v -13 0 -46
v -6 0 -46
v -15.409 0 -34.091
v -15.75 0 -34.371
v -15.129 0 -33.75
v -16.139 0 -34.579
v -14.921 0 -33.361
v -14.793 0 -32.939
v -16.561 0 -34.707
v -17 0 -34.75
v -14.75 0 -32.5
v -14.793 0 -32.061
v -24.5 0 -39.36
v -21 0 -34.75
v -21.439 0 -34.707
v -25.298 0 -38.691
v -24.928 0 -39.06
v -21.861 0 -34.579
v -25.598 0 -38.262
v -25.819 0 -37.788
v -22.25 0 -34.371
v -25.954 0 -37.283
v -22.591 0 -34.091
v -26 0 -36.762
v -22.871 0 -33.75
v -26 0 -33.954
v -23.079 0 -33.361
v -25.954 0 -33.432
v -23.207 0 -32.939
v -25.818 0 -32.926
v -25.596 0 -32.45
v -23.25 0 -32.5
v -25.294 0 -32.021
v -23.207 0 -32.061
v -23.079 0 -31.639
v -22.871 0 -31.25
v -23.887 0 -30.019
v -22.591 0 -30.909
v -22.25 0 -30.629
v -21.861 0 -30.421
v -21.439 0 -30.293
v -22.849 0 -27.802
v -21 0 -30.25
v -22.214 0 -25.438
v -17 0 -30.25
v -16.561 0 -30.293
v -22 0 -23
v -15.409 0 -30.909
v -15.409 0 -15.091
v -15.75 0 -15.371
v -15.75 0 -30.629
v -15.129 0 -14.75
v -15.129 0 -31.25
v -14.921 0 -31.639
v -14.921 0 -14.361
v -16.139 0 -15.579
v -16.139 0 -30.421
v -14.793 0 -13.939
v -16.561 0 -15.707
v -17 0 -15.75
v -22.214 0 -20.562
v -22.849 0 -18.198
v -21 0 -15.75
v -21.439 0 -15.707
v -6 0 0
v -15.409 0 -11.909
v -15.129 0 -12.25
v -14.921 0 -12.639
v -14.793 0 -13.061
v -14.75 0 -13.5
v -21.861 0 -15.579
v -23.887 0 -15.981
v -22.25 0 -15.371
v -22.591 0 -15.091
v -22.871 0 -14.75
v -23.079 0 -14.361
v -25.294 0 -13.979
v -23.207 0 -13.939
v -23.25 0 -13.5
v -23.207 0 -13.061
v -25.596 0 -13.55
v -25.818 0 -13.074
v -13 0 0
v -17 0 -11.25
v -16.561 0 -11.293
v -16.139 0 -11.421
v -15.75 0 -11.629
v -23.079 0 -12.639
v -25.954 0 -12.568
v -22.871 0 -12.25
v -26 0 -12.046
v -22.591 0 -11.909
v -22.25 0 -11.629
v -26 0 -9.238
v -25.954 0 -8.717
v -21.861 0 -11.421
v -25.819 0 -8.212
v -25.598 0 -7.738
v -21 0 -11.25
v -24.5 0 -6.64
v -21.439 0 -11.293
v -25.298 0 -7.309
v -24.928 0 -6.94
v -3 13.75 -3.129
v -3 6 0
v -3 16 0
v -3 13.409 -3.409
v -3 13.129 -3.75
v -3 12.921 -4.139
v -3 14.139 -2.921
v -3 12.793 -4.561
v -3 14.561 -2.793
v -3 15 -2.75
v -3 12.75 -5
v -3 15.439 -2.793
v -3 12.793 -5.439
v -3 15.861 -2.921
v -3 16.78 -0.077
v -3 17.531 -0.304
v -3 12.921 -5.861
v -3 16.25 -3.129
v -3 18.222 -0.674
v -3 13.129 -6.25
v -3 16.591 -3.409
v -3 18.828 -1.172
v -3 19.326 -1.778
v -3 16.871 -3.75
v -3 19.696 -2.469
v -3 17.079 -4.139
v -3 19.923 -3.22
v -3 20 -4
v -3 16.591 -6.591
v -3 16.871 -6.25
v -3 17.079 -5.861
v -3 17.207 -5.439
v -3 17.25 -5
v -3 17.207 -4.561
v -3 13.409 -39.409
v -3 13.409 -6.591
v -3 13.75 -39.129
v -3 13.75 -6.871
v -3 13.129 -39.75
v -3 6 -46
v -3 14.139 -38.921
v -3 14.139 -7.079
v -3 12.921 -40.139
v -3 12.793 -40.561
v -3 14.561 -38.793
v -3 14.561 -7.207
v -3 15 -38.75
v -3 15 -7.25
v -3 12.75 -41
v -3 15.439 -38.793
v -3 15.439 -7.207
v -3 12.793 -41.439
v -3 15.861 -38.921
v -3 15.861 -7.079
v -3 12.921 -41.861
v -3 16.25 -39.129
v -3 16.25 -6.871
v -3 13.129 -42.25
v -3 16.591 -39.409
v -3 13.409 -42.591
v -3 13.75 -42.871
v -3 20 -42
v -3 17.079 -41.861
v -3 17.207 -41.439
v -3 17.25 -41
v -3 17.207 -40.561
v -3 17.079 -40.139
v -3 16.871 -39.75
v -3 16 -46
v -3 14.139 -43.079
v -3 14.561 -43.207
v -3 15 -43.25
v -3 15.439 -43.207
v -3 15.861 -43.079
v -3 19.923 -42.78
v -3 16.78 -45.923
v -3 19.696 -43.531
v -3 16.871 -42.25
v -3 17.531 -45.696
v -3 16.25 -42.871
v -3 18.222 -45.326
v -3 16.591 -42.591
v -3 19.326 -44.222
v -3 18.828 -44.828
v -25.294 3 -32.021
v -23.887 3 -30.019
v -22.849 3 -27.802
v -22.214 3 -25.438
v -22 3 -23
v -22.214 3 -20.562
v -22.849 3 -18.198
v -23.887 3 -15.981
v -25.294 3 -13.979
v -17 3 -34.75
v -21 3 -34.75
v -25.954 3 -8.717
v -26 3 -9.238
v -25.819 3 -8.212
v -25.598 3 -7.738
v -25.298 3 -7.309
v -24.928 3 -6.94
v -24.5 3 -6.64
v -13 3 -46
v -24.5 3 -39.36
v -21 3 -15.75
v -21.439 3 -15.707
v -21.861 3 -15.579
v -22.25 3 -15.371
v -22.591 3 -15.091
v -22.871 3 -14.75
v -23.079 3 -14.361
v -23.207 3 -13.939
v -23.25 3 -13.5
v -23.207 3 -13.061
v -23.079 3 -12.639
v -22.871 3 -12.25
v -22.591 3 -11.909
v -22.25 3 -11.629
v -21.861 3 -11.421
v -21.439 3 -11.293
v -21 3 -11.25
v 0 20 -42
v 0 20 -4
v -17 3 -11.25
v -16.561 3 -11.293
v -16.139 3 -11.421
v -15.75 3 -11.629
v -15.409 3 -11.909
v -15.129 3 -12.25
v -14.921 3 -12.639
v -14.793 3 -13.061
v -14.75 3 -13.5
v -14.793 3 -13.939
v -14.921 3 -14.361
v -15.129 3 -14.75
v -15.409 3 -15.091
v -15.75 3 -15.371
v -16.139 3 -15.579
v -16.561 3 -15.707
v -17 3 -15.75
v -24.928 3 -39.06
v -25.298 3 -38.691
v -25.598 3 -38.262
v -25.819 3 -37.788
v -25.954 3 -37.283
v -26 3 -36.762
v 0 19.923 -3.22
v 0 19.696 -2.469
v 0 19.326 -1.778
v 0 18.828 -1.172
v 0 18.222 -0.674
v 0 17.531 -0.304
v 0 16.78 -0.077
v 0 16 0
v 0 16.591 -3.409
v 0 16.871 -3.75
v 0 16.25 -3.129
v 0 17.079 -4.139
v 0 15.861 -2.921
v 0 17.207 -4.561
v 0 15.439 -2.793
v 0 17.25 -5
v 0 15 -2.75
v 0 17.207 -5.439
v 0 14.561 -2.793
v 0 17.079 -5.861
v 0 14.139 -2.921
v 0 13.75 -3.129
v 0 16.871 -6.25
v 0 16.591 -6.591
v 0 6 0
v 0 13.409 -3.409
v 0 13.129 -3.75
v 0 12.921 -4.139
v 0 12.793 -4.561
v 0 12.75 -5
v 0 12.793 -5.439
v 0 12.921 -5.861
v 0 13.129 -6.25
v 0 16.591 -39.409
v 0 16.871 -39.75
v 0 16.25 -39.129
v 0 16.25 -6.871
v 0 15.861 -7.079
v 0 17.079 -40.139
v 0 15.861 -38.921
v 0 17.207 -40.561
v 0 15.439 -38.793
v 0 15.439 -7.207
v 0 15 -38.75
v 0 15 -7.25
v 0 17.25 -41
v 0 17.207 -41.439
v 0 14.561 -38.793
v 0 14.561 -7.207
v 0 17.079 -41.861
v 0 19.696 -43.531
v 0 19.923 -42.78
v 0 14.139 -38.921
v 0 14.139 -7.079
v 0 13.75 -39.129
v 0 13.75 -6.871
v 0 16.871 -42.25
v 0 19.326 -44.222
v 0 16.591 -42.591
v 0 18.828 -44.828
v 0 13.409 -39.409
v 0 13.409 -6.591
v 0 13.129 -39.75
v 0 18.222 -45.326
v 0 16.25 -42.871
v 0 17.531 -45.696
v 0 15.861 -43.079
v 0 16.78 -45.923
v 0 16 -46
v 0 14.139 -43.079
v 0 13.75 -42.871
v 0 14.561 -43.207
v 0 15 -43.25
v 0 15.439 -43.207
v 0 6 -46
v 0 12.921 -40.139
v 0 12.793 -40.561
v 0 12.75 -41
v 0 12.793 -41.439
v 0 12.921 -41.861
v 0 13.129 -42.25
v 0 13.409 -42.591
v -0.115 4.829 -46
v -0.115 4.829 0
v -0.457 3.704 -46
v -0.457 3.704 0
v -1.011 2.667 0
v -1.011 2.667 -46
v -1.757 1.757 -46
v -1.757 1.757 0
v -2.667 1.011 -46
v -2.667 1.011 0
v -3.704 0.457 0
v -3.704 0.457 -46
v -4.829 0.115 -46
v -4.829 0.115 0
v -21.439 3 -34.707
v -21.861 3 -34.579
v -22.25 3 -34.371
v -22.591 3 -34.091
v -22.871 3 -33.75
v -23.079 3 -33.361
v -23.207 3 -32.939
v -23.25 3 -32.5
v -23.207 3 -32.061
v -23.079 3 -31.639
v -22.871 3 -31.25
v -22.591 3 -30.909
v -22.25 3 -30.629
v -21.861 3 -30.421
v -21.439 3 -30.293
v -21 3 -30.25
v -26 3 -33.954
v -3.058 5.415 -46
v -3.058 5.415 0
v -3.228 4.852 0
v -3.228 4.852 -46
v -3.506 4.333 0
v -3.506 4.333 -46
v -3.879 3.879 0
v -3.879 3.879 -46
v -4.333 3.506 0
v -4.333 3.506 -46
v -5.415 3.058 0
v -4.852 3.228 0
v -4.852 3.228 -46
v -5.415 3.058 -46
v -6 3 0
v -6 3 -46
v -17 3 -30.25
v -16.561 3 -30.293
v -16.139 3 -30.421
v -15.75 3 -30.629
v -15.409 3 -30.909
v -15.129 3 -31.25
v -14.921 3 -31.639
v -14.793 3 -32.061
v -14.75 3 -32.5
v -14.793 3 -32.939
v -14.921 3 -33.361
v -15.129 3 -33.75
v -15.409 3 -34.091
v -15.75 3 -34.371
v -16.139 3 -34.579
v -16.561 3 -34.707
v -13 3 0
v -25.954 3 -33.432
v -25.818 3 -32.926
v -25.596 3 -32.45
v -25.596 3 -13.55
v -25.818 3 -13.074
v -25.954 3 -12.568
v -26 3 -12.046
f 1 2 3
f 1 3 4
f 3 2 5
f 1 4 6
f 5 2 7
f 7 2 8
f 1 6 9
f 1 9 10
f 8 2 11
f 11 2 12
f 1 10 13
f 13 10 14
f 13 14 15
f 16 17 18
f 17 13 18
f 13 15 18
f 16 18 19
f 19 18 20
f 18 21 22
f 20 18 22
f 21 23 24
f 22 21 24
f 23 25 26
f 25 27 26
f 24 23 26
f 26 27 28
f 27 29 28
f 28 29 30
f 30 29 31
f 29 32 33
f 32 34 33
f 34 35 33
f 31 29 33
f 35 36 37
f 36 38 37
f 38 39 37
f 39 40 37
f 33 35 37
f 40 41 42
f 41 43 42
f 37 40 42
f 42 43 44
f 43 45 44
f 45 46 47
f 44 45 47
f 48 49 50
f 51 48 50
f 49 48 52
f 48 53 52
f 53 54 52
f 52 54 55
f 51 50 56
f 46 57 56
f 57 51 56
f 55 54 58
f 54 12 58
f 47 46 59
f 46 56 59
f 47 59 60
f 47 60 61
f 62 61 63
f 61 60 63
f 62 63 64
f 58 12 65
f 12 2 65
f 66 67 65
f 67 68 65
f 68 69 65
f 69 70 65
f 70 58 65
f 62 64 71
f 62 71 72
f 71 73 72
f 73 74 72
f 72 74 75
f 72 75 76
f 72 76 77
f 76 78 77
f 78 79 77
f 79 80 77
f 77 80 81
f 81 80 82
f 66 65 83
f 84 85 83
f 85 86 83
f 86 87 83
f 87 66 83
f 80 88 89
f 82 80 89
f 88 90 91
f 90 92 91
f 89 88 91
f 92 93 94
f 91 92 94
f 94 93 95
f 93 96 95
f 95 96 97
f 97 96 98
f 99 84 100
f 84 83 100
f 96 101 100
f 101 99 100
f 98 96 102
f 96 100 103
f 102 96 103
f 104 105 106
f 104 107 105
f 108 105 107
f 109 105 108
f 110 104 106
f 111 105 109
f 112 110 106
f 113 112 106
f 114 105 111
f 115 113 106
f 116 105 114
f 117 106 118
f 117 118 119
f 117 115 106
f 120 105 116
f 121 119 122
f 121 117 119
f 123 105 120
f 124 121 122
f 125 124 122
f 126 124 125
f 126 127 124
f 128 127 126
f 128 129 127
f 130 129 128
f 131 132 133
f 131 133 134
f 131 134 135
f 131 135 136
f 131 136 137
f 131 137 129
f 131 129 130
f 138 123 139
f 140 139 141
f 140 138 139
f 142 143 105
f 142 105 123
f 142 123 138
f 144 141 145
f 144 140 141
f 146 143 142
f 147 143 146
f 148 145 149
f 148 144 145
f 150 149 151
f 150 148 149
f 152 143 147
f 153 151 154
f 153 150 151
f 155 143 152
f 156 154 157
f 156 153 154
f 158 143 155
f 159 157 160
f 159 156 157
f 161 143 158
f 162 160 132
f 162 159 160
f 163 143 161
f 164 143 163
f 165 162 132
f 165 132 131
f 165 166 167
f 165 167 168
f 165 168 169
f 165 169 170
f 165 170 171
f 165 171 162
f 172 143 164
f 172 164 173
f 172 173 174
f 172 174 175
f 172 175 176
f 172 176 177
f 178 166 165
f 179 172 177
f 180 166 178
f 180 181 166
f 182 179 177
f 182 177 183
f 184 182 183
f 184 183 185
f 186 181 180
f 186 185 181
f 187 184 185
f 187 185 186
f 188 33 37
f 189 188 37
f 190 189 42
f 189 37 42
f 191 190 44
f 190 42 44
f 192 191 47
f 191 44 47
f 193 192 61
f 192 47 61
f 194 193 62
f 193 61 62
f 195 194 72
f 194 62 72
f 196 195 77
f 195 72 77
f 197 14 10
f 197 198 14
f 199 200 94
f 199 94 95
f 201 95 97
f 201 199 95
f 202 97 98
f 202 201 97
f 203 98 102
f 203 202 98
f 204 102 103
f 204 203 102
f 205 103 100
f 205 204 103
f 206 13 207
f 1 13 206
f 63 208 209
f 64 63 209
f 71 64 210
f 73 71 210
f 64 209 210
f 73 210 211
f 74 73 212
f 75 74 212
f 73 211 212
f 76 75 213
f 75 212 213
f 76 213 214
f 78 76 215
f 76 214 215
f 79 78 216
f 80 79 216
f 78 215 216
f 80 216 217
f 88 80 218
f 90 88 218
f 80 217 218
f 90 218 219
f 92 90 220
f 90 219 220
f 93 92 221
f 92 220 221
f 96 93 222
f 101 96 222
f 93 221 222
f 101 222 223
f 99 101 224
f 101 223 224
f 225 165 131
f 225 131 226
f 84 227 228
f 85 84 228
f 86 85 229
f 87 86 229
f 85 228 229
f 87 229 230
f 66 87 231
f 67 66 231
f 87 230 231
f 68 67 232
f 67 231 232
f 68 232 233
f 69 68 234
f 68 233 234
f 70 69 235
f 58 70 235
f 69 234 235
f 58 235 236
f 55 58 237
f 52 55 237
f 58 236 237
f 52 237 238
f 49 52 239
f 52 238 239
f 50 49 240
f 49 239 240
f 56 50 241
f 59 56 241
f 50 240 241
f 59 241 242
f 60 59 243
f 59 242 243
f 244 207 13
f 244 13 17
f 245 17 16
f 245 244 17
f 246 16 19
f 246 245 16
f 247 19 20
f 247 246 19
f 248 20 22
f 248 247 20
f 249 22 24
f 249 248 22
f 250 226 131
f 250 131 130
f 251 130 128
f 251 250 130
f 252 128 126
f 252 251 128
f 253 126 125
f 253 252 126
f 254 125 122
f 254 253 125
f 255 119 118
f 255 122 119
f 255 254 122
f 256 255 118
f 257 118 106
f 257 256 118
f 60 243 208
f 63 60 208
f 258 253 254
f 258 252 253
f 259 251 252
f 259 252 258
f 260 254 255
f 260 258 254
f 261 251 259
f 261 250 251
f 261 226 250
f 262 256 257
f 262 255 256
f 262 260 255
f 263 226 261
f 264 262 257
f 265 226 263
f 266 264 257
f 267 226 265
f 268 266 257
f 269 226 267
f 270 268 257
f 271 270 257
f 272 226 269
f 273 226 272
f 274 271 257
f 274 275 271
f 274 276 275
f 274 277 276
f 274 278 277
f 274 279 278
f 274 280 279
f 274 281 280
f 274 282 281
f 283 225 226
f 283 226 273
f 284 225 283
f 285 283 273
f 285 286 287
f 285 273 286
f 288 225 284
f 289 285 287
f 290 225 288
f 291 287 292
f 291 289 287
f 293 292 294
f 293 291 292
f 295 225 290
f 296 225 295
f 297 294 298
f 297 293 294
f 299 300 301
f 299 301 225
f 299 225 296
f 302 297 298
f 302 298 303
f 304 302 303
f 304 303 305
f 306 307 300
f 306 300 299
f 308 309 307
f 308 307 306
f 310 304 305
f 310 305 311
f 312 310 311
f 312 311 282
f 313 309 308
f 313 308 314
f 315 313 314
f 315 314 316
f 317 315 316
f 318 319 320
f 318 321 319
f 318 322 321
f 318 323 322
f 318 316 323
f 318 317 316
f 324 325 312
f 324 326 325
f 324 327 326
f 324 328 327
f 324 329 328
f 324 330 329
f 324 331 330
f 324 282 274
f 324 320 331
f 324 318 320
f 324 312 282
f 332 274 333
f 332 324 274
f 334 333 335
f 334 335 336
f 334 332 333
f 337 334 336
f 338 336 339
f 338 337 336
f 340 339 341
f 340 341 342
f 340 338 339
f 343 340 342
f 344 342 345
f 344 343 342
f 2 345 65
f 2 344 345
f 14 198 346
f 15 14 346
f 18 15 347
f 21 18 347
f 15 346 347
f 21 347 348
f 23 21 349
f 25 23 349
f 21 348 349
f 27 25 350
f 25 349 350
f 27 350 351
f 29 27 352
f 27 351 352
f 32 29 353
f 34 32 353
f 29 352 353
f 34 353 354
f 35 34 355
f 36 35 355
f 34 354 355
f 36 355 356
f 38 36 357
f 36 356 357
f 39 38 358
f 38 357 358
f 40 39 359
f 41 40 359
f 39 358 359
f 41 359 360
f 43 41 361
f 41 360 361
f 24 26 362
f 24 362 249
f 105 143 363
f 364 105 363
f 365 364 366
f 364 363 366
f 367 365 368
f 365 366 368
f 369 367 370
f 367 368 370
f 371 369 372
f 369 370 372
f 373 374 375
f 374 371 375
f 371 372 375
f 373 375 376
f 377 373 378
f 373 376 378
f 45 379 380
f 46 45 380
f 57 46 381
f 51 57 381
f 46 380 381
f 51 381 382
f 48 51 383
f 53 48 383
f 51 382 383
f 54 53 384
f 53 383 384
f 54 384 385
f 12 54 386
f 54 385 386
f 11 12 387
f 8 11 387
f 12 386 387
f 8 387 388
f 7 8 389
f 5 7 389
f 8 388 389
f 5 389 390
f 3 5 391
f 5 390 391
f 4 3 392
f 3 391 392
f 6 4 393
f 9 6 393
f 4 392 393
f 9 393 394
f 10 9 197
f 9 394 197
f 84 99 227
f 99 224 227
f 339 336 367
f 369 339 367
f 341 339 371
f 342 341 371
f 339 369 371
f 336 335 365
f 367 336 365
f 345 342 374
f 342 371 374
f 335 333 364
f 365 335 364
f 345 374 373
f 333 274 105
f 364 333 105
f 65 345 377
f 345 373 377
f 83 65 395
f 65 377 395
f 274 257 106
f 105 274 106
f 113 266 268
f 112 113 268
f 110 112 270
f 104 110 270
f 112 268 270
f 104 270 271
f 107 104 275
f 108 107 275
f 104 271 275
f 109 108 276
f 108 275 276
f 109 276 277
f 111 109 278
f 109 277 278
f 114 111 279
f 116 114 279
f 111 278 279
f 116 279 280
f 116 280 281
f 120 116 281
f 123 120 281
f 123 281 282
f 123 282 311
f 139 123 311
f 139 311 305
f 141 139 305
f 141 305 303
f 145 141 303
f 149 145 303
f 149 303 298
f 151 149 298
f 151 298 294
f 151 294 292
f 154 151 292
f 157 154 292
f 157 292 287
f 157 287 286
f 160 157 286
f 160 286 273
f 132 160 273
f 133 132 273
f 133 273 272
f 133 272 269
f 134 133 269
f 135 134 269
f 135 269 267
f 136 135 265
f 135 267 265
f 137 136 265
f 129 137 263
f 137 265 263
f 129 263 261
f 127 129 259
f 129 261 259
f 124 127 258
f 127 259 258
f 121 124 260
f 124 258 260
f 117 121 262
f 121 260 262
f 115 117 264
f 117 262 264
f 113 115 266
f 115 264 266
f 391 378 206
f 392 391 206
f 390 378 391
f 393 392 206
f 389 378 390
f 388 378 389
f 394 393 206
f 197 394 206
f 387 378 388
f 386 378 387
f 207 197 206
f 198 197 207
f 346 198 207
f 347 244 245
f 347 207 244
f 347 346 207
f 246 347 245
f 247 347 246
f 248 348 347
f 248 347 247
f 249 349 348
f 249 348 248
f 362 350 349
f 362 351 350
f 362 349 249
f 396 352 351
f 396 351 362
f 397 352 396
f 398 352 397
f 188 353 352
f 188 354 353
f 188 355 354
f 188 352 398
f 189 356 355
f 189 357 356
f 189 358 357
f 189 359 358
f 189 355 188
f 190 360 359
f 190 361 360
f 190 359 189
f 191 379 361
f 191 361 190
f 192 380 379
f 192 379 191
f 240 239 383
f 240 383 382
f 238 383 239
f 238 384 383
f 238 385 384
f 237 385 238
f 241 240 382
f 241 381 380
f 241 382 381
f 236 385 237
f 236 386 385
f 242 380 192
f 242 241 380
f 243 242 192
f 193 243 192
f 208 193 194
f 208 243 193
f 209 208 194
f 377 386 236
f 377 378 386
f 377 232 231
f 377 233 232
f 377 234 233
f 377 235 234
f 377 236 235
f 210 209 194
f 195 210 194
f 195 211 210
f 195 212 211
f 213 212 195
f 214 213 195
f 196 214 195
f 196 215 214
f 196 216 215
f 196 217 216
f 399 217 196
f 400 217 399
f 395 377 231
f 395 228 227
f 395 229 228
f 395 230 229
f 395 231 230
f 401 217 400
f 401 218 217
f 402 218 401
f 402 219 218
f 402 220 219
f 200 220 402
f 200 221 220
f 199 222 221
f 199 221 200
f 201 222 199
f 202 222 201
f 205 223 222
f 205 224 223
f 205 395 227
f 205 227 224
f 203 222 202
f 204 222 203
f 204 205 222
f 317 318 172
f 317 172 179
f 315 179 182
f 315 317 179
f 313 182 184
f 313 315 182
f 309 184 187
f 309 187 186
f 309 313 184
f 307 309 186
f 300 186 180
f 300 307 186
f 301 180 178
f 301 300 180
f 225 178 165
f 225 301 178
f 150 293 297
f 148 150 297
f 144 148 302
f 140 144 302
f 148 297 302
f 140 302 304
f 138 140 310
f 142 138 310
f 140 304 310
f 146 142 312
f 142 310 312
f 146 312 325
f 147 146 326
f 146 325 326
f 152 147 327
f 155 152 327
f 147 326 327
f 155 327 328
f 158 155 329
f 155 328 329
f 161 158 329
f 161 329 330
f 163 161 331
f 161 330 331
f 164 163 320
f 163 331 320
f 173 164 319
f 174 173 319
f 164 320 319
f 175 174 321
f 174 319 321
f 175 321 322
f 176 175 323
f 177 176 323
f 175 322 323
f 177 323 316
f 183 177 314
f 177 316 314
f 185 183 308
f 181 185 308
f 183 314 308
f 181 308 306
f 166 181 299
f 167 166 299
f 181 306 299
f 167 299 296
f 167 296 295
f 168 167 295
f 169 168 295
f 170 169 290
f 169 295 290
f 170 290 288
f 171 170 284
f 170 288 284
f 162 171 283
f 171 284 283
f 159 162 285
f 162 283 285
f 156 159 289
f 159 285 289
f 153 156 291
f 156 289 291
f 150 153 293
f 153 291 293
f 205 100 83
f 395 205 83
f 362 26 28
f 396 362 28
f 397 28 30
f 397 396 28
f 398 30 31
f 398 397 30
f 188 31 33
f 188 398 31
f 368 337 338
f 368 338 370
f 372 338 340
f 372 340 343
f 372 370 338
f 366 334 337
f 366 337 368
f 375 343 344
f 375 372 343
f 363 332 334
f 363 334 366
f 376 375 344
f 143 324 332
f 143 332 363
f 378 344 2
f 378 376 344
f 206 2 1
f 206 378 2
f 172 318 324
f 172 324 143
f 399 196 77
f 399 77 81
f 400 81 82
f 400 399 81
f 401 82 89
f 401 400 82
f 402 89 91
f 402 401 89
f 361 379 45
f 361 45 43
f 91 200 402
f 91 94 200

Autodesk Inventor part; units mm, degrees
ref_plane "YZ Plane" through (0, 0, 0) normal (1, 0, 0) x (0, 1, 0)
ref_plane "XZ Plane" through (0, 0, 0) normal (0, 1, 0) x (-1, 0, 0)
ref_plane "XY Plane" through (0, 0, 0) normal (0, 0, 1) x (1, 0, 0)
sketch "Náčrt1" plane through (0, 0, 0) normal (0, 1, 0) x (-1, 0, 0)
  line L0 (0, 0) -> (26, 0)
  line L1 (13, -46) -> (0, -46)
  line L2 (0, -46) -> (0, 0)
  line L3 (26, -7.5056) -> (13, 0)
  line L4 (35.4765, -23) -> (0, -23) construction
  arc A0 (26, -13.202) -> (26, -32.798) centre (36, -23) ccw
  line L5 (26, -38.4944) -> (13, -46)
  line L6 (26, -7.5056) -> (26, -13.202)
  line L7 (26, -32.798) -> (26, -38.4944)
  point P0 (13, 0)
  dimension "d15" = -30
  dimension "d17" = 28
  dimension "d18" = 36
  dimension "d19" = 26
  dimension "d20" = 13
  dimension "d21" = 46
  dimension "d22" = 7.5056
extrude "Deska1" add sketch "Náčrt1" along normal blind 3
sketch "Náčrt2" plane through (-3, 0, -46) normal (1, 0, 0) x (0, 1, 0)
  line L0 (0, 46) -> (0, 0)
  line L1 (0, 0) -> (20, 0)
  line L2 (20, 0) -> (20, 46)
  line L3 (20, 46) -> (0, 46)
edge flange "Obruba1" height 20 angle 90 thickness 3 bend radius 3 thickness toward (1, 0, 0) relief tear relief width 3 relief depth 1.5 edges at (0, 3, -23) wall of the first edge with corners at (-3, 0, 0) (-3, 0, -46) (-3, 20, -46) (-3, 20, 0)
bend "Ohyb1"
corner "Roh1"
fillet "Zaoblení rohu1" radius 3 4 edges at (-26, 1.5, -7.5056) (-26, 1.5, -38.4944) (-26, 1.5, -13.202) (-26, 1.5, -32.798)
fillet "Zaoblení rohu2" radius 4 2 edges at (-1.5, 20, -46) (-1.5, 20, 0)
sketch "Náčrt3" plane through (-3, 6, -46) normal (-1, 0, 0) x (0, 0, 1)
  line L0 (42, 14) -> (4, 14) projected
  line L1 (23, 14) -> (23, 0) construction
  line L2 (46, 0) -> (0, 0) construction
  line L3 (0, -6) -> (46, -6) construction
  point P0 (41, 9)
  point P1 (5, 9)
  dimension "d25" = 36
  dimension "d26" = 15
hole "Díra1" at (-3, 15, -5) at (-3, 15, -41) direction (1, 0, 0) diameter 4.5 end through all
sketch "Náčrt4" plane through (0, 3, 0) normal (0, 1, 0) x (1, 0, 0)
  line L0 (-21, 13.5) -> (-17, 13.5) construction
  line L1 (-21, 11.25) -> (-17, 11.25)
  line L2 (-17, 15.75) -> (-21, 15.75)
  arc A0 (-21, 15.75) -> (-21, 11.25) centre (-21, 13.5) ccw
  arc A1 (-17, 11.25) -> (-17, 15.75) centre (-17, 13.5) ccw
  arc A2 (-26, 13.202) -> (-26, 32.798) centre (-36, 23) ccw projected
  line L3 (-22, 23) -> (-6, 23) construction
  line L4 (-6, 0) -> (-6, 46) construction
  line L5 (-21, 32.5) -> (-17, 32.5) construction
  line L6 (-21, 34.75) -> (-17, 34.75)
  line L7 (-17, 30.25) -> (-21, 30.25)
  arc A3 (-21, 34.75) -> (-21, 30.25) centre (-21, 32.5) ccw
  arc A4 (-17, 30.25) -> (-17, 34.75) centre (-17, 32.5) ccw
  line L8 (-6, 0) -> (-13, 0) construction
  line L9 (-26, 9.2376) -> (-26, 13.202) construction
  point P0 (0, 0)
  point P1 (-19, 13.5)
  point P2 (-19, 32.5)
  point P3 (-19, 32.5)
  dimension "d36" = 4
  dimension "d37" = 4.5
  dimension "d40" = 19
  dimension "d41" = 5
extrude "Vysunutí1" cut sketch "Náčrt4" against normal up to next
equation "\"d32\" = Tloušťka"
equation "\"d3\" = Tloušťka"
equation "\"d4\" = ŠířkaVýštipu"
equation "\"d5\" = HloubkaVýštipu"
equation "\"d6\" = MinimálníZbytek"
equation "\"d7\" = PřechodovýPoloměr"
equation "\"d10\" = PoloměrOhybu"
equation "\"d11\" = VelikostRohovéhoVýštipu"
equation "\"d12\" = VelikostMezery"
equation "\"d13\" = VelikostJacobihoPoloměru"
equation "\"PoloměrOhybu\" = Tloušťka"
equation "\"ŠířkaVýštipu\" = Tloušťka"
equation "\"HloubkaVýštipu\" = 0.5 * Tloušťka"
equation "\"VelikostRohovéhoVýštipu\" = 4 * Tloušťka"
equation "\"MinimálníZbytek\" = 2 * Tloušťka"
equation "\"PřechodovýPoloměr\" = PoloměrOhybu"
equation "\"VelikostJacobihoPoloměru\" = PoloměrOhybu"
equation "\"VelikostMezery\" = Tloušťka"
equation "\"Tloušťka\" = 3"
properties part number "drzak_valce2" material "Železo, kujné"
